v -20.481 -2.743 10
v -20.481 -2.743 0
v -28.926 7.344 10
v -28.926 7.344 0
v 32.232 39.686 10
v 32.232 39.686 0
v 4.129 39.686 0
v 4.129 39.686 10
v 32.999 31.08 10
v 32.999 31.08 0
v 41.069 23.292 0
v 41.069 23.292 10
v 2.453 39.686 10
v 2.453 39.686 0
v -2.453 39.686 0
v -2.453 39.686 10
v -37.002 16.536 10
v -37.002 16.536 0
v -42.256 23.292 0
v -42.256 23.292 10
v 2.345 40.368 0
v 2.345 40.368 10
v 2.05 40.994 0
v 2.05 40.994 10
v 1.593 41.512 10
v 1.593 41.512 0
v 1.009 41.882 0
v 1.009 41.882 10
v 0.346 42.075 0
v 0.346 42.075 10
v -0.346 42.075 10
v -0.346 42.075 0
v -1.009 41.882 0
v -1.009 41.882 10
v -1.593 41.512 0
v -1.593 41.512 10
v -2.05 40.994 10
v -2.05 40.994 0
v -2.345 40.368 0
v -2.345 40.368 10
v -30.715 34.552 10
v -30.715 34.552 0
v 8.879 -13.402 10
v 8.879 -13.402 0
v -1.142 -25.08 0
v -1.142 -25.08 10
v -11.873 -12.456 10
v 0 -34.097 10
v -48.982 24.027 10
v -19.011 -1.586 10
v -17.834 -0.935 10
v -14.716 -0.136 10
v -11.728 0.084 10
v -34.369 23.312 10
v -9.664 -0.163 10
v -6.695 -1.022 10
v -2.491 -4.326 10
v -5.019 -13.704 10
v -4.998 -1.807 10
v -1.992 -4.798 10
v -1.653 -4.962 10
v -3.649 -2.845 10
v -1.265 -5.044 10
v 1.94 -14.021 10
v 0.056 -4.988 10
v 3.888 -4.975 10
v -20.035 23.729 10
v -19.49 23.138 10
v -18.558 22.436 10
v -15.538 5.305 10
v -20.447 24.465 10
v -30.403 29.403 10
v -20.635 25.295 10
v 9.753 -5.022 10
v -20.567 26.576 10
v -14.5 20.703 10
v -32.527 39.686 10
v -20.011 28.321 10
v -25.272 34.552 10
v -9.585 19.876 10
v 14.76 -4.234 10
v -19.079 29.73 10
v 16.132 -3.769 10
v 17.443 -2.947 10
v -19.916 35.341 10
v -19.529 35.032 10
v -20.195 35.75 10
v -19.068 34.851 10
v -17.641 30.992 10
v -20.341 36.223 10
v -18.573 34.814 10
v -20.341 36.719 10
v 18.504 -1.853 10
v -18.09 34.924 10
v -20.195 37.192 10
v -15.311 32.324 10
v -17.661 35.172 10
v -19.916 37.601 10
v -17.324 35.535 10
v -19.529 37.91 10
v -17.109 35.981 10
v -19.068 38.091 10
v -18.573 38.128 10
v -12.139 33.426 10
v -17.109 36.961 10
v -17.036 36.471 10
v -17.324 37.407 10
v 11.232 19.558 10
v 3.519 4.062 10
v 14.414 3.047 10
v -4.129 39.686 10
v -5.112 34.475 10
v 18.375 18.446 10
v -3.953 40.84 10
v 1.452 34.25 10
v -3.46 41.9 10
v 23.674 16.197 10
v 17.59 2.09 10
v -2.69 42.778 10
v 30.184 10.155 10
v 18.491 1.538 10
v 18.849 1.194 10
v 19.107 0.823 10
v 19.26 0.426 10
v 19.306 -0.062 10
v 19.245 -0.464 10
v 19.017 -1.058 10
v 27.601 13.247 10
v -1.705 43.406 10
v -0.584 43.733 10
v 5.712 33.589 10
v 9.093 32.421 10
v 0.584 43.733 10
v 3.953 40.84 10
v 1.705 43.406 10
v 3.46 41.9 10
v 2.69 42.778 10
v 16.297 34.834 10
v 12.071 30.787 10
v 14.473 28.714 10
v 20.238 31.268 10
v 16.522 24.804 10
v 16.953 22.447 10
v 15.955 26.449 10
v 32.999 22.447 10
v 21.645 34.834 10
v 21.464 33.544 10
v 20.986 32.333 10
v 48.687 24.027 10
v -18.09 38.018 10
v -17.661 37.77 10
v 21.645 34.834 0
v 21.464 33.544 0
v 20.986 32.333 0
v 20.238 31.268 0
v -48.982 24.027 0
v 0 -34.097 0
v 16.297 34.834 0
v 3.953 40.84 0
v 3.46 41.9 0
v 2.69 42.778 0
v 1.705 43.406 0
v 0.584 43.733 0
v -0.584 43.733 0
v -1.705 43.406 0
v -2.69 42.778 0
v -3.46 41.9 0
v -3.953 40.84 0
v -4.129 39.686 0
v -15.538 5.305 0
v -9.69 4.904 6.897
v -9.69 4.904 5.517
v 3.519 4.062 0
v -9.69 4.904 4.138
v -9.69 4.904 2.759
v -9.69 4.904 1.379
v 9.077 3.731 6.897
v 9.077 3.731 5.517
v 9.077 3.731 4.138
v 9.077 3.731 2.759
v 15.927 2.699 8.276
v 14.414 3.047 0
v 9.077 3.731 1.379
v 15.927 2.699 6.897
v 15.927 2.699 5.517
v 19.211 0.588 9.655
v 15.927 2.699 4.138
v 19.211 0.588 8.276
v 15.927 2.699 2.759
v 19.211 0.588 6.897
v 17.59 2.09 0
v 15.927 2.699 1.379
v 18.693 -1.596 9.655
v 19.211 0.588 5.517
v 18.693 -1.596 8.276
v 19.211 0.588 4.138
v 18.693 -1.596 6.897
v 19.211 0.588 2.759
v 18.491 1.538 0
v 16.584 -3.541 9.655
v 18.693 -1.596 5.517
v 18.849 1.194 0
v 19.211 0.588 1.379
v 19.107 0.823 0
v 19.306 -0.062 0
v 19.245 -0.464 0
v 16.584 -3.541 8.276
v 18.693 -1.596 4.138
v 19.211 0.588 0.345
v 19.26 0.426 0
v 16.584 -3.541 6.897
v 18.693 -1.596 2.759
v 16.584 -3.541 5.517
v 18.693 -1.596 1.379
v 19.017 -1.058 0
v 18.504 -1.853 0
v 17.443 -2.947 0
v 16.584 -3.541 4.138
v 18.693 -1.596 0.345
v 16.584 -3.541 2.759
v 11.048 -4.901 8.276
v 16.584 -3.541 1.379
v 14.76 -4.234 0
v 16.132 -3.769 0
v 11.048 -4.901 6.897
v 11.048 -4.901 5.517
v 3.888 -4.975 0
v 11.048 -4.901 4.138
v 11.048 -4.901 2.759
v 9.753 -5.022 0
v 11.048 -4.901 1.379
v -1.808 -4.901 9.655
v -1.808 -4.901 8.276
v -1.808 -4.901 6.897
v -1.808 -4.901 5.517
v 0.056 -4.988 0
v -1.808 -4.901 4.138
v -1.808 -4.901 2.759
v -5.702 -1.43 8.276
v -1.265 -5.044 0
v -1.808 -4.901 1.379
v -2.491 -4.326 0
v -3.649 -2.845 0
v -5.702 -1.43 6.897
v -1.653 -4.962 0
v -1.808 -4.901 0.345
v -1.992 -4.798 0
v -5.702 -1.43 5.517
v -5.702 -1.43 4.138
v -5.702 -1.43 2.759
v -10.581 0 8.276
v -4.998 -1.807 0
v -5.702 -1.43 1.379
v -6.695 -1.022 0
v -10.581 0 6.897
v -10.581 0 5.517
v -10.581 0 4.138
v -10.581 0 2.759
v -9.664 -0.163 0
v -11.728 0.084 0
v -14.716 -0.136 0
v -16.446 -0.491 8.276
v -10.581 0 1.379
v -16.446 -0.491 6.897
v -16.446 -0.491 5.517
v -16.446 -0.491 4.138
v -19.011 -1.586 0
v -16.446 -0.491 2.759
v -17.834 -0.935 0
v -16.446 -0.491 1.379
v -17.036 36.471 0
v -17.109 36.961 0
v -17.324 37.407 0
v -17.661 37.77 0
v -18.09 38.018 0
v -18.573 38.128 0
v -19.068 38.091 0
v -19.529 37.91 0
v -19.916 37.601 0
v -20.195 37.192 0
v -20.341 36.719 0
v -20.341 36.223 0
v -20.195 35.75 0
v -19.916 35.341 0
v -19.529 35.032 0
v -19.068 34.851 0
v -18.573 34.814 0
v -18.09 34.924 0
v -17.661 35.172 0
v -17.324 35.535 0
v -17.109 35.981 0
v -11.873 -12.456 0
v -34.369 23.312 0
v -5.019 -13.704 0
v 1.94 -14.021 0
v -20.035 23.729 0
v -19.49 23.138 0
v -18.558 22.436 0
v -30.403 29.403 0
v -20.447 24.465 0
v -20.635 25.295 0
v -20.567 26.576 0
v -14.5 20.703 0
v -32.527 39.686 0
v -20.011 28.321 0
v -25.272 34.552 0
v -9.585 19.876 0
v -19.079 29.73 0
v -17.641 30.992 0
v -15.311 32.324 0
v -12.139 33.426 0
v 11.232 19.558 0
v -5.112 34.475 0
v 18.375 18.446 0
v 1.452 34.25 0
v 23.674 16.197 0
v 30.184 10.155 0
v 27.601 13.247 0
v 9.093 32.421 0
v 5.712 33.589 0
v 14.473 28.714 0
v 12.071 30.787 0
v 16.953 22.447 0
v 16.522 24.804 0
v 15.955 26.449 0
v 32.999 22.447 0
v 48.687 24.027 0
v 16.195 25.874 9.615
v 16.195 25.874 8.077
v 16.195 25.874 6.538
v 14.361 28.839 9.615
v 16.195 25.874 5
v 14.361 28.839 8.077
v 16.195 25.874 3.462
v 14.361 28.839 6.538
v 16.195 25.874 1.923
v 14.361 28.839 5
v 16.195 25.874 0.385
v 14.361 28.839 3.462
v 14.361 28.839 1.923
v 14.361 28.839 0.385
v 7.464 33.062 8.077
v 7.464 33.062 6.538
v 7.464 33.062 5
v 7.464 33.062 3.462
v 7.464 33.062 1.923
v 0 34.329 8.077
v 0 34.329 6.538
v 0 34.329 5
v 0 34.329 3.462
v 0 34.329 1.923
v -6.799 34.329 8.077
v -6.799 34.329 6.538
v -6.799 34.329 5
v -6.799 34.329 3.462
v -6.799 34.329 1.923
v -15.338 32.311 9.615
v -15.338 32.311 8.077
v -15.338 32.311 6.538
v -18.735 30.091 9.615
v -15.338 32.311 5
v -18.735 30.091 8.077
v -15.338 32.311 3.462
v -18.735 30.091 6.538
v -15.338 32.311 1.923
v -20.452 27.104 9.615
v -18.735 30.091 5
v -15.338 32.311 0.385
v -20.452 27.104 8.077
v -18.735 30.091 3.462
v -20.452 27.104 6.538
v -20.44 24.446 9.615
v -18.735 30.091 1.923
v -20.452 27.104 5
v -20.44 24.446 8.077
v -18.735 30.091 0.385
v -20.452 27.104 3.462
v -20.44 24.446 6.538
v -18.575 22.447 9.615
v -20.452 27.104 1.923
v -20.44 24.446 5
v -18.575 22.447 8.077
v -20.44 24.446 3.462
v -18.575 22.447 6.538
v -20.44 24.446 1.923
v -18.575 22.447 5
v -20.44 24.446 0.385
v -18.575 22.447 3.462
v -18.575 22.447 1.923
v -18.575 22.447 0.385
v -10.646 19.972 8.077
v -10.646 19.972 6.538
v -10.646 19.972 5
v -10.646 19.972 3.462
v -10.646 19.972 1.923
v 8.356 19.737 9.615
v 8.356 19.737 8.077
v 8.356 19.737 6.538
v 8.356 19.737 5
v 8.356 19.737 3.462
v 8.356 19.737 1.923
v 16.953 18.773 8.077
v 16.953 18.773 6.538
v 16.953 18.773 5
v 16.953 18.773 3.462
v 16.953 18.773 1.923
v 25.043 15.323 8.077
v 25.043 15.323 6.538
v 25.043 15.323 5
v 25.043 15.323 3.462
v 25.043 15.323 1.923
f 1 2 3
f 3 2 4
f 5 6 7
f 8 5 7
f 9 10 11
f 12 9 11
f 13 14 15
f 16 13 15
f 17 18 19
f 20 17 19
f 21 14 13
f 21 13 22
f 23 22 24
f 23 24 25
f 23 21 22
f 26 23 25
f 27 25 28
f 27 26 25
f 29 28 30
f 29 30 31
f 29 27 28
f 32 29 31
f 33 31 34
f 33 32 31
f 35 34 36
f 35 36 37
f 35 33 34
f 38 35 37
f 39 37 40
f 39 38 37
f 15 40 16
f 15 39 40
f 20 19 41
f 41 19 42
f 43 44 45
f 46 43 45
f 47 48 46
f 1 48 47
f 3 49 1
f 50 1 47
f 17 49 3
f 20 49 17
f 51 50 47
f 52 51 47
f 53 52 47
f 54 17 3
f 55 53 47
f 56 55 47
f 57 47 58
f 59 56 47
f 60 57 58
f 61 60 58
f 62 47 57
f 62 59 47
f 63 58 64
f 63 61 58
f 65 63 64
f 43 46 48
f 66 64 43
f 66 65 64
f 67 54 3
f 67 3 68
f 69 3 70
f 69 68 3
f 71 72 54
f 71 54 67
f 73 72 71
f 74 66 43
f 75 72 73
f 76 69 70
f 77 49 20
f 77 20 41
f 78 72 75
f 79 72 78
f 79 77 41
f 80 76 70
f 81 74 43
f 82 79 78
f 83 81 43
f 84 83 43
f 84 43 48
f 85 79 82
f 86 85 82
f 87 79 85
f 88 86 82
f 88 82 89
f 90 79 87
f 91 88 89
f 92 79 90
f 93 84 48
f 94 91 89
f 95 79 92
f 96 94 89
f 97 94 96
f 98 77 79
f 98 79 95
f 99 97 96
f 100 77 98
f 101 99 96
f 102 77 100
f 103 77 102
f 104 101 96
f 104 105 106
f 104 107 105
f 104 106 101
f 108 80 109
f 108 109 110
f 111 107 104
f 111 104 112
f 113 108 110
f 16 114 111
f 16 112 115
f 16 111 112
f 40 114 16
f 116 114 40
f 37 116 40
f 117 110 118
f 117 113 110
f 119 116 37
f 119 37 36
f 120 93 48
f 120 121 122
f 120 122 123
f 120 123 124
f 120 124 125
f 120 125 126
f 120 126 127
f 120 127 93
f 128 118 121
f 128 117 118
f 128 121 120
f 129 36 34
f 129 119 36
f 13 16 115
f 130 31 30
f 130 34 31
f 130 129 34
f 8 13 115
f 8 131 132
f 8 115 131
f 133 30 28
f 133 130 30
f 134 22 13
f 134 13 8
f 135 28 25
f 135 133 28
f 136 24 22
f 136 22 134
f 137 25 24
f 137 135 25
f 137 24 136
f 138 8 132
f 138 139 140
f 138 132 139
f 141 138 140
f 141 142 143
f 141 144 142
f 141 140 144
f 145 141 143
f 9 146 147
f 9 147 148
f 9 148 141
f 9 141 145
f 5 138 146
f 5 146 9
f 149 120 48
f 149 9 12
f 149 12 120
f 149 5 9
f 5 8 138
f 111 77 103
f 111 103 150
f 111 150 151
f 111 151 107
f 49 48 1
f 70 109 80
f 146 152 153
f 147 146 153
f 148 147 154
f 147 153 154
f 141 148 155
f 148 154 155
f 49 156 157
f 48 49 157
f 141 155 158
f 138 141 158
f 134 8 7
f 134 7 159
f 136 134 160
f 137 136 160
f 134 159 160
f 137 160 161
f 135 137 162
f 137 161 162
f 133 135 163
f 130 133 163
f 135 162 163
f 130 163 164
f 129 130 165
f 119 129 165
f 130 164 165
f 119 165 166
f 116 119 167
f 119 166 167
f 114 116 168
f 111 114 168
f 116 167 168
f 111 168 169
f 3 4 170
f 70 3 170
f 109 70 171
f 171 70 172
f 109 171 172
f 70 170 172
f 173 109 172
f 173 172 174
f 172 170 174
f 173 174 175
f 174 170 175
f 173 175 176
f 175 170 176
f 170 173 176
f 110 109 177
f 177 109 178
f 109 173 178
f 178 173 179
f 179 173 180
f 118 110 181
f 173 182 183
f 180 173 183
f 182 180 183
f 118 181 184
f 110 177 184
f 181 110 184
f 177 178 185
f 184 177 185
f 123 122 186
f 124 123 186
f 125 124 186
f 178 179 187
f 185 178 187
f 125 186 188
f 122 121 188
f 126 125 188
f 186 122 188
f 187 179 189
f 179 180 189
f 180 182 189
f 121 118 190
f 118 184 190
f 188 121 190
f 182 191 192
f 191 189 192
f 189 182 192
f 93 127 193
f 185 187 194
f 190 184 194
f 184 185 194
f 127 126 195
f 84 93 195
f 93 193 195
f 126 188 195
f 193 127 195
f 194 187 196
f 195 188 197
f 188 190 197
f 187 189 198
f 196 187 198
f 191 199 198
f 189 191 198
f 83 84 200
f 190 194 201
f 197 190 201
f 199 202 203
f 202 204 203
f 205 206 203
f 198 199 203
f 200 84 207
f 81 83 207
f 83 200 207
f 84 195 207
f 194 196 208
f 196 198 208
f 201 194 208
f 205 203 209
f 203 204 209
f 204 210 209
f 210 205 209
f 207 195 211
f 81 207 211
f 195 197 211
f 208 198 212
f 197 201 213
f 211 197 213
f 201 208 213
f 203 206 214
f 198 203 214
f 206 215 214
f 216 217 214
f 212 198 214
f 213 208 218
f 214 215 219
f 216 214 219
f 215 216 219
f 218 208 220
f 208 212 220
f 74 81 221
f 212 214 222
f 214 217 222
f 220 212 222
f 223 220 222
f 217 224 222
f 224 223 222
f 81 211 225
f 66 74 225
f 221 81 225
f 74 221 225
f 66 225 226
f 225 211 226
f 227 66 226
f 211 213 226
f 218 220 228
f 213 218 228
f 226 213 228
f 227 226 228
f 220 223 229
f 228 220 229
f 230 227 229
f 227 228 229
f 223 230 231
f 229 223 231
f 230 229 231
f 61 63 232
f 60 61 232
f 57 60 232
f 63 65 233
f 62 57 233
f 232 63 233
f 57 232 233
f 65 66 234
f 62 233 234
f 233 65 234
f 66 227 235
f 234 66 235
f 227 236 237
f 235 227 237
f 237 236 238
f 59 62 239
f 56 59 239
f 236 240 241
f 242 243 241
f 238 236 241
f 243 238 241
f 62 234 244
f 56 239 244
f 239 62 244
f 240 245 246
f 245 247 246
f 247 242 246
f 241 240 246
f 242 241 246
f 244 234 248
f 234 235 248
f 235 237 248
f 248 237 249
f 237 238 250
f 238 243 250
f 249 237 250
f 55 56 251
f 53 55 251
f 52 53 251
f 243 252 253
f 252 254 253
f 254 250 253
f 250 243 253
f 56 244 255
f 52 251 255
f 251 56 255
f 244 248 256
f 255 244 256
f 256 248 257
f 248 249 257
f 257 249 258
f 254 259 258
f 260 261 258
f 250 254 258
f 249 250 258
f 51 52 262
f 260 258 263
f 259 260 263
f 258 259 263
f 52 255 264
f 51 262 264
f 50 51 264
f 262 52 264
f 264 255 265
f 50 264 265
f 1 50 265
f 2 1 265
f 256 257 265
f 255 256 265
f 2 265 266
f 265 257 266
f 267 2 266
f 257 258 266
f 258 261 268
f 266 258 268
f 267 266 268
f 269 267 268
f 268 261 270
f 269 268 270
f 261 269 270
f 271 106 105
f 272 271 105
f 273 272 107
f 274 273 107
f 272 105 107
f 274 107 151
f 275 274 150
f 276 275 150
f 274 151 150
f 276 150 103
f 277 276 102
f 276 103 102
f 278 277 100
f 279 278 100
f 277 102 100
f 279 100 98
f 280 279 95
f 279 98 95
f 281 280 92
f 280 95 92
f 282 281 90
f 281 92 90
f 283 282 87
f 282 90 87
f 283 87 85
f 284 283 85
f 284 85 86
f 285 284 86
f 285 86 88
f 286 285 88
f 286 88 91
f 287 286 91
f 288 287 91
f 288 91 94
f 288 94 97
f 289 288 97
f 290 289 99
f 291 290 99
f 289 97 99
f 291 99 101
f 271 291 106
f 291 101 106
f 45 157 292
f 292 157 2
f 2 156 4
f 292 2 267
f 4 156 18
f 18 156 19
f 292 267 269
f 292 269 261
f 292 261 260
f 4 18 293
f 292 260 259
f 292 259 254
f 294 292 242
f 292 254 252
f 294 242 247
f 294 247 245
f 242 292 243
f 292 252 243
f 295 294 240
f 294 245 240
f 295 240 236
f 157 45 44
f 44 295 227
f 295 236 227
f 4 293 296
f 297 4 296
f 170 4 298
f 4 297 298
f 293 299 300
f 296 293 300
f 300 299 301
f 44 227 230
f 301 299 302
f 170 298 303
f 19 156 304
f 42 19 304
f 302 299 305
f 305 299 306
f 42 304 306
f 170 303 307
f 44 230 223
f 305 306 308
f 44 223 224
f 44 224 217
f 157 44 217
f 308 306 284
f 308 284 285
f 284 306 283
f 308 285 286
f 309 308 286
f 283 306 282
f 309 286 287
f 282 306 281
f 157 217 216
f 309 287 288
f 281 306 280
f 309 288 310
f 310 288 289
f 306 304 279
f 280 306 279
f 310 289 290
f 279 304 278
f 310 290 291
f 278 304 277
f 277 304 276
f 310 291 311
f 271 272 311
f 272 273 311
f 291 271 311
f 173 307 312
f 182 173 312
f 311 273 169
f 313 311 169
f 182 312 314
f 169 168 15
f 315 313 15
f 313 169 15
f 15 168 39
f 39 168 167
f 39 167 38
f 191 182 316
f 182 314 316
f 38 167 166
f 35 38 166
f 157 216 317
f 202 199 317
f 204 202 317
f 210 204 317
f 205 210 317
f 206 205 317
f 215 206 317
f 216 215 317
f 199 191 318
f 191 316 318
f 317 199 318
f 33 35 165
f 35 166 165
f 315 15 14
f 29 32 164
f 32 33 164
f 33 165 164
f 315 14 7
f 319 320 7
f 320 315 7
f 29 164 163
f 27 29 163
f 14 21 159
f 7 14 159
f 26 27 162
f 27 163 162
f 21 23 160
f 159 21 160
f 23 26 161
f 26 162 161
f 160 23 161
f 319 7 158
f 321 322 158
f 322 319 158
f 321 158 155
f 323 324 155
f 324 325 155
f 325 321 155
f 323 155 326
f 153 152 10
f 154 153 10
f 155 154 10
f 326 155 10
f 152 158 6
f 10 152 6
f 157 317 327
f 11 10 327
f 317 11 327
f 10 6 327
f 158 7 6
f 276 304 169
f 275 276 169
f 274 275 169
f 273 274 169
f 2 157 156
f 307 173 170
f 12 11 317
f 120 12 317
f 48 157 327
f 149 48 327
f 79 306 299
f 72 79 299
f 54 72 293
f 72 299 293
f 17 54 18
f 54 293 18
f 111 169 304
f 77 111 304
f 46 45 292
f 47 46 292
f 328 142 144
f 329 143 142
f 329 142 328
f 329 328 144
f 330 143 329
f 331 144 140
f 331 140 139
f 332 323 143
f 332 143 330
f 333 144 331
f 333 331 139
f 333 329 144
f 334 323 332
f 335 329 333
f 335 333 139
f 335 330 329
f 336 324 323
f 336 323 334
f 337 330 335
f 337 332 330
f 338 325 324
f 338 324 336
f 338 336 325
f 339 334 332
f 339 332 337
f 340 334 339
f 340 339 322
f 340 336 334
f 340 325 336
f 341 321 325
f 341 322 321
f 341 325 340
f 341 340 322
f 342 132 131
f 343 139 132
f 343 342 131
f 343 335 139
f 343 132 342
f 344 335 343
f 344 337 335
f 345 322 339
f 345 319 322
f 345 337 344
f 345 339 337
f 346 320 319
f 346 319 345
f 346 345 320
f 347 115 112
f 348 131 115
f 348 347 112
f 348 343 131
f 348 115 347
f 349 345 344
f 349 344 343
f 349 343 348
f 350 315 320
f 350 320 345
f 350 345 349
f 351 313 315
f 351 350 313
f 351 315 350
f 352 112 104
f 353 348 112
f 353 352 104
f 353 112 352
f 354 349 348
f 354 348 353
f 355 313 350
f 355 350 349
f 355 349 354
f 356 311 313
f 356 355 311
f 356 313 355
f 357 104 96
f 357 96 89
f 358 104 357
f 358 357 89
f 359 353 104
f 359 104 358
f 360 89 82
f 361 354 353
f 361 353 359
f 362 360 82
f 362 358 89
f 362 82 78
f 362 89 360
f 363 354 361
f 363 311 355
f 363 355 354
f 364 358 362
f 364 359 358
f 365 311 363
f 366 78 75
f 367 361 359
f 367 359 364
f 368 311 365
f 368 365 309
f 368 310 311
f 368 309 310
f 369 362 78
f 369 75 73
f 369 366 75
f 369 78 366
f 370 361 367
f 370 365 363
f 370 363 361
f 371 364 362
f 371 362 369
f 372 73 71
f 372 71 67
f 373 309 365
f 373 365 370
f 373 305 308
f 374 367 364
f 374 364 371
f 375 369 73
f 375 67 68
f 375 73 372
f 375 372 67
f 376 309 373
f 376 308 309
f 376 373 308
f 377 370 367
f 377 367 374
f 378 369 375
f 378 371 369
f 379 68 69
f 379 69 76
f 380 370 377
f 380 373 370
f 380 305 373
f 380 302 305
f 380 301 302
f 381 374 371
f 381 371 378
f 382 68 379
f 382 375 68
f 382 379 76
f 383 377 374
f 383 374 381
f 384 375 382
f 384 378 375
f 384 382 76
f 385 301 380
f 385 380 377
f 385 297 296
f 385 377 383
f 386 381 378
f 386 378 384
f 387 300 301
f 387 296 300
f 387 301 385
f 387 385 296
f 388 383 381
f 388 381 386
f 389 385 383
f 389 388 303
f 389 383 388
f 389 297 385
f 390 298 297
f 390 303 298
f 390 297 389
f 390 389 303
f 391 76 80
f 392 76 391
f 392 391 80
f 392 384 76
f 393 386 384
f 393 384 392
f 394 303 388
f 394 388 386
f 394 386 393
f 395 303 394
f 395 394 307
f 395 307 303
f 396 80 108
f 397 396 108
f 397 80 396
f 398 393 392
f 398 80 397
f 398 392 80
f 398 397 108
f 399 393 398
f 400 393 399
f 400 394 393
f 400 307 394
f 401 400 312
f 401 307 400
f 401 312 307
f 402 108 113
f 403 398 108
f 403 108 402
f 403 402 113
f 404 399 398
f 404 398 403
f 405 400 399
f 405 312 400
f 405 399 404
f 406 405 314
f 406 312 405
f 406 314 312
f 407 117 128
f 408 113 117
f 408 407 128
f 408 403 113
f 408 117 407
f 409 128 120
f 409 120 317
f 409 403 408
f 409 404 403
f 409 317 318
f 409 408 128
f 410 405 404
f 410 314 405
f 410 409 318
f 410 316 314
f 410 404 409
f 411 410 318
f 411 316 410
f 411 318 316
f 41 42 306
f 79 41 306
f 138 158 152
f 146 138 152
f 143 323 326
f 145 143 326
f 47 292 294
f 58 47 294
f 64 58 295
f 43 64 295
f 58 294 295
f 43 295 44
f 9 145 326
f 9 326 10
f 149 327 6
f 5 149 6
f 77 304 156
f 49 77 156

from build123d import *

# Parameters (mm, degrees)
F1_DEPTH = 10
F2_R     = 4.1291172472
F2_R_2   = 2.4536472003
F3_DEPTH = 10
F4_R     = 1.6620527227
F5_DEPTH = 10


with BuildPart() as f1:
    # F0 (on Top) → F1 (new body)
    with BuildSketch(Plane.XY):
        Polygon((48.6871339381, 24.0267701447), (32.2320349514, 39.6856553853), (-32.526742667, 39.6856553853), (-48.9818416536, 24.0267701447), (0, -34.0968854725), align=None)
        with BuildLine():
            Line((-1.1419440852, -25.0803939998), (-11.873068288, -12.4555416405))
            ThreePointArc((-11.873068288, -12.4555416405), (-1.5449667897, -13.9798475555), (8.879031986, -13.4024061263))
            Line((8.879031986, -13.4024061263), (-1.1419440852, -25.0803939998))
        make_face(mode=Mode.SUBTRACT)
        with BuildLine():
            Line((-20.4806253314, -2.7432614006), (-28.9257541299, 7.3439762928))
            add(Edge.make_bspline(
                [(-28.9257541299, 7.3439762928), (-27.7041557533, 7.1042516196), (-25.1343417086, 6.5999550817), (-20.5071721755, 5.9186828612), (-15.2941459695, 5.2027810961), (-9.6967303355, 4.912056573), (-5.0065526043, 4.6277734968), (-0.0258348095, 4.2978486992), (5.1043461483, 3.9475572244), (9.0171892798, 3.78550029), (12.7687184921, 3.3374030894), (15.8589246558, 2.8271719807), (18.354253956, 1.846017111), (19.3456576886, 0.6543818951), (19.3343744233, -0.6639424899), (18.3203235578, -2.2288312883), (16.6207460101, -3.7015245055), (14.3263622499, -4.4031891089), (10.9927891698, -4.9676859057), (8.0209735922, -5.133913569), (4.1714143655, -5.0413954433), (1.0080516098, -4.7142444082), (-2.0628040973, -5.4417284499), (-3.2020564374, -2.9509618201), (-5.6502647675, -1.2927149709), (-8.0959932843, -0.5875744815), (-10.5743010217, 0.1454018515), (-13.6740035748, 0.0866319645), (-16.4345411652, -0.4367687795), (-18.5324211083, -1.1113439505), (-19.8146148511, -2.1853762919), (-20.4806253314, -2.7432614006)],
                knots=[0, 0, 0, 0, 0.0380762841, 0.080099132, 0.1251342494, 0.1712257874, 0.2134681593, 0.2570747621, 0.3012784126, 0.3399936328, 0.3776268916, 0.4124933602, 0.4439470678, 0.4669989198, 0.4881011378, 0.5143180706, 0.5432093149, 0.5733261064, 0.6088934877, 0.6429519661, 0.6809417518, 0.7165108938, 0.7483745487, 0.7780914579, 0.8113771663, 0.8424148757, 0.8735568422, 0.9078438929, 0.9405140025, 0.9691011612, 1, 1, 1, 1], degree=3))
        make_face(mode=Mode.SUBTRACT)
        with BuildLine():
            Line((-30.7146701962, 34.5521233976), (-25.2722520381, 34.5521233976))
            ThreePointArc((-25.2722520381, 34.5521233976), (-32.5438240837, 26.4599346385), (-37.0015986264, 16.5358465165))
            Line((-37.0015986264, 16.5358465165), (-42.2563478351, 23.2919491827))
            Line((-42.2563478351, 23.2919491827), (-30.7146701962, 34.5521233976))
        make_face(mode=Mode.SUBTRACT)
        with BuildLine():
            Line((32.9991430044, 22.4474351853), (32.9991430044, 31.0802347958))
            Line((32.9991430044, 31.0802347958), (41.0689339042, 23.2919491827))
            Line((41.0689339042, 23.2919491827), (30.1840994507, 10.1550798863))
            add(Edge.make_bspline(
                [(16.9533975422, 22.4474351853), (16.7763630876, 23.6204972546), (16.4233922904, 25.9593451066), (14.4919082724, 29.0067524158), (11.4904366669, 31.3338997816), (7.5509848624, 33.2071783395), (3.1893253694, 34.2167292744), (0.0358040039, 34.2895670891), (-3.2978287831, 34.6044239604), (-6.8113658449, 34.3891801132), (-11.5691240889, 33.6738660531), (-15.3215294824, 32.5136949841), (-19.1958746976, 30.1421993503), (-20.6153048829, 27.2288525323), (-20.8155992268, 24.3032637665), (-18.6131368315, 22.2111671921), (-14.7115151734, 20.6089967349), (-10.604713445, 19.8609182978), (-5.9503220493, 19.7101519654), (-0.0214302707, 19.3884805067), (4.3629930527, 19.726026752), (8.3651996911, 19.8085427382), (12.7556258455, 19.447607518), (16.9835267692, 18.8503988421), (20.7946936237, 17.8259063338), (25.1154626388, 15.4857554411), (28.3855587226, 12.6477632954), (29.6222967244, 10.9337090901), (30.1840994507, 10.1550798863)],
                knots=[0, 0, 0, 0, 0.0363315316, 0.0724377054, 0.1098728187, 0.1505281026, 0.1913243143, 0.2257292376, 0.260578427, 0.2971712123, 0.339382906, 0.3783565619, 0.4187888916, 0.4531535528, 0.4845428977, 0.5167359254, 0.5564092211, 0.5959018756, 0.6378853615, 0.6851507204, 0.7258566415, 0.7643019496, 0.8049882992, 0.8448797337, 0.8832775553, 0.9261996139, 0.96647531, 1, 1, 1, 1], degree=3))
            Line((16.9533975422, 22.4474351853), (32.9991430044, 22.4474351853))
        make_face(mode=Mode.SUBTRACT)
        with BuildLine():
            Line((20.2376134694, 31.2679037452), (16.2965524942, 34.833624959))
            Line((16.2965524942, 34.833624959), (21.6451361775, 34.833624959))
            ThreePointArc((21.6451361775, 34.833624959), (21.2607610669, 32.9246907296), (20.2376134694, 31.2679037452))
        make_face(mode=Mode.SUBTRACT)
    extrude(amount=F1_DEPTH)

    # F2 (on Top) → F3 (join)
    with BuildSketch(Plane.XY):
        with Locations((0, 39.645884186)):
            Circle(F2_R)
        with Locations((0, 39.645884186)):
            Circle(F2_R_2, mode=Mode.SUBTRACT)
    extrude(amount=F3_DEPTH)

    # F4 (on face) → F5 (cut, through all)
    with BuildSketch(Plane.XY.offset(10)):
        with Locations((-18.6976976693, 36.4709980786)):
            Circle(F4_R)
    extrude(amount=-F5_DEPTH, mode=Mode.SUBTRACT)


solid = f1.part
